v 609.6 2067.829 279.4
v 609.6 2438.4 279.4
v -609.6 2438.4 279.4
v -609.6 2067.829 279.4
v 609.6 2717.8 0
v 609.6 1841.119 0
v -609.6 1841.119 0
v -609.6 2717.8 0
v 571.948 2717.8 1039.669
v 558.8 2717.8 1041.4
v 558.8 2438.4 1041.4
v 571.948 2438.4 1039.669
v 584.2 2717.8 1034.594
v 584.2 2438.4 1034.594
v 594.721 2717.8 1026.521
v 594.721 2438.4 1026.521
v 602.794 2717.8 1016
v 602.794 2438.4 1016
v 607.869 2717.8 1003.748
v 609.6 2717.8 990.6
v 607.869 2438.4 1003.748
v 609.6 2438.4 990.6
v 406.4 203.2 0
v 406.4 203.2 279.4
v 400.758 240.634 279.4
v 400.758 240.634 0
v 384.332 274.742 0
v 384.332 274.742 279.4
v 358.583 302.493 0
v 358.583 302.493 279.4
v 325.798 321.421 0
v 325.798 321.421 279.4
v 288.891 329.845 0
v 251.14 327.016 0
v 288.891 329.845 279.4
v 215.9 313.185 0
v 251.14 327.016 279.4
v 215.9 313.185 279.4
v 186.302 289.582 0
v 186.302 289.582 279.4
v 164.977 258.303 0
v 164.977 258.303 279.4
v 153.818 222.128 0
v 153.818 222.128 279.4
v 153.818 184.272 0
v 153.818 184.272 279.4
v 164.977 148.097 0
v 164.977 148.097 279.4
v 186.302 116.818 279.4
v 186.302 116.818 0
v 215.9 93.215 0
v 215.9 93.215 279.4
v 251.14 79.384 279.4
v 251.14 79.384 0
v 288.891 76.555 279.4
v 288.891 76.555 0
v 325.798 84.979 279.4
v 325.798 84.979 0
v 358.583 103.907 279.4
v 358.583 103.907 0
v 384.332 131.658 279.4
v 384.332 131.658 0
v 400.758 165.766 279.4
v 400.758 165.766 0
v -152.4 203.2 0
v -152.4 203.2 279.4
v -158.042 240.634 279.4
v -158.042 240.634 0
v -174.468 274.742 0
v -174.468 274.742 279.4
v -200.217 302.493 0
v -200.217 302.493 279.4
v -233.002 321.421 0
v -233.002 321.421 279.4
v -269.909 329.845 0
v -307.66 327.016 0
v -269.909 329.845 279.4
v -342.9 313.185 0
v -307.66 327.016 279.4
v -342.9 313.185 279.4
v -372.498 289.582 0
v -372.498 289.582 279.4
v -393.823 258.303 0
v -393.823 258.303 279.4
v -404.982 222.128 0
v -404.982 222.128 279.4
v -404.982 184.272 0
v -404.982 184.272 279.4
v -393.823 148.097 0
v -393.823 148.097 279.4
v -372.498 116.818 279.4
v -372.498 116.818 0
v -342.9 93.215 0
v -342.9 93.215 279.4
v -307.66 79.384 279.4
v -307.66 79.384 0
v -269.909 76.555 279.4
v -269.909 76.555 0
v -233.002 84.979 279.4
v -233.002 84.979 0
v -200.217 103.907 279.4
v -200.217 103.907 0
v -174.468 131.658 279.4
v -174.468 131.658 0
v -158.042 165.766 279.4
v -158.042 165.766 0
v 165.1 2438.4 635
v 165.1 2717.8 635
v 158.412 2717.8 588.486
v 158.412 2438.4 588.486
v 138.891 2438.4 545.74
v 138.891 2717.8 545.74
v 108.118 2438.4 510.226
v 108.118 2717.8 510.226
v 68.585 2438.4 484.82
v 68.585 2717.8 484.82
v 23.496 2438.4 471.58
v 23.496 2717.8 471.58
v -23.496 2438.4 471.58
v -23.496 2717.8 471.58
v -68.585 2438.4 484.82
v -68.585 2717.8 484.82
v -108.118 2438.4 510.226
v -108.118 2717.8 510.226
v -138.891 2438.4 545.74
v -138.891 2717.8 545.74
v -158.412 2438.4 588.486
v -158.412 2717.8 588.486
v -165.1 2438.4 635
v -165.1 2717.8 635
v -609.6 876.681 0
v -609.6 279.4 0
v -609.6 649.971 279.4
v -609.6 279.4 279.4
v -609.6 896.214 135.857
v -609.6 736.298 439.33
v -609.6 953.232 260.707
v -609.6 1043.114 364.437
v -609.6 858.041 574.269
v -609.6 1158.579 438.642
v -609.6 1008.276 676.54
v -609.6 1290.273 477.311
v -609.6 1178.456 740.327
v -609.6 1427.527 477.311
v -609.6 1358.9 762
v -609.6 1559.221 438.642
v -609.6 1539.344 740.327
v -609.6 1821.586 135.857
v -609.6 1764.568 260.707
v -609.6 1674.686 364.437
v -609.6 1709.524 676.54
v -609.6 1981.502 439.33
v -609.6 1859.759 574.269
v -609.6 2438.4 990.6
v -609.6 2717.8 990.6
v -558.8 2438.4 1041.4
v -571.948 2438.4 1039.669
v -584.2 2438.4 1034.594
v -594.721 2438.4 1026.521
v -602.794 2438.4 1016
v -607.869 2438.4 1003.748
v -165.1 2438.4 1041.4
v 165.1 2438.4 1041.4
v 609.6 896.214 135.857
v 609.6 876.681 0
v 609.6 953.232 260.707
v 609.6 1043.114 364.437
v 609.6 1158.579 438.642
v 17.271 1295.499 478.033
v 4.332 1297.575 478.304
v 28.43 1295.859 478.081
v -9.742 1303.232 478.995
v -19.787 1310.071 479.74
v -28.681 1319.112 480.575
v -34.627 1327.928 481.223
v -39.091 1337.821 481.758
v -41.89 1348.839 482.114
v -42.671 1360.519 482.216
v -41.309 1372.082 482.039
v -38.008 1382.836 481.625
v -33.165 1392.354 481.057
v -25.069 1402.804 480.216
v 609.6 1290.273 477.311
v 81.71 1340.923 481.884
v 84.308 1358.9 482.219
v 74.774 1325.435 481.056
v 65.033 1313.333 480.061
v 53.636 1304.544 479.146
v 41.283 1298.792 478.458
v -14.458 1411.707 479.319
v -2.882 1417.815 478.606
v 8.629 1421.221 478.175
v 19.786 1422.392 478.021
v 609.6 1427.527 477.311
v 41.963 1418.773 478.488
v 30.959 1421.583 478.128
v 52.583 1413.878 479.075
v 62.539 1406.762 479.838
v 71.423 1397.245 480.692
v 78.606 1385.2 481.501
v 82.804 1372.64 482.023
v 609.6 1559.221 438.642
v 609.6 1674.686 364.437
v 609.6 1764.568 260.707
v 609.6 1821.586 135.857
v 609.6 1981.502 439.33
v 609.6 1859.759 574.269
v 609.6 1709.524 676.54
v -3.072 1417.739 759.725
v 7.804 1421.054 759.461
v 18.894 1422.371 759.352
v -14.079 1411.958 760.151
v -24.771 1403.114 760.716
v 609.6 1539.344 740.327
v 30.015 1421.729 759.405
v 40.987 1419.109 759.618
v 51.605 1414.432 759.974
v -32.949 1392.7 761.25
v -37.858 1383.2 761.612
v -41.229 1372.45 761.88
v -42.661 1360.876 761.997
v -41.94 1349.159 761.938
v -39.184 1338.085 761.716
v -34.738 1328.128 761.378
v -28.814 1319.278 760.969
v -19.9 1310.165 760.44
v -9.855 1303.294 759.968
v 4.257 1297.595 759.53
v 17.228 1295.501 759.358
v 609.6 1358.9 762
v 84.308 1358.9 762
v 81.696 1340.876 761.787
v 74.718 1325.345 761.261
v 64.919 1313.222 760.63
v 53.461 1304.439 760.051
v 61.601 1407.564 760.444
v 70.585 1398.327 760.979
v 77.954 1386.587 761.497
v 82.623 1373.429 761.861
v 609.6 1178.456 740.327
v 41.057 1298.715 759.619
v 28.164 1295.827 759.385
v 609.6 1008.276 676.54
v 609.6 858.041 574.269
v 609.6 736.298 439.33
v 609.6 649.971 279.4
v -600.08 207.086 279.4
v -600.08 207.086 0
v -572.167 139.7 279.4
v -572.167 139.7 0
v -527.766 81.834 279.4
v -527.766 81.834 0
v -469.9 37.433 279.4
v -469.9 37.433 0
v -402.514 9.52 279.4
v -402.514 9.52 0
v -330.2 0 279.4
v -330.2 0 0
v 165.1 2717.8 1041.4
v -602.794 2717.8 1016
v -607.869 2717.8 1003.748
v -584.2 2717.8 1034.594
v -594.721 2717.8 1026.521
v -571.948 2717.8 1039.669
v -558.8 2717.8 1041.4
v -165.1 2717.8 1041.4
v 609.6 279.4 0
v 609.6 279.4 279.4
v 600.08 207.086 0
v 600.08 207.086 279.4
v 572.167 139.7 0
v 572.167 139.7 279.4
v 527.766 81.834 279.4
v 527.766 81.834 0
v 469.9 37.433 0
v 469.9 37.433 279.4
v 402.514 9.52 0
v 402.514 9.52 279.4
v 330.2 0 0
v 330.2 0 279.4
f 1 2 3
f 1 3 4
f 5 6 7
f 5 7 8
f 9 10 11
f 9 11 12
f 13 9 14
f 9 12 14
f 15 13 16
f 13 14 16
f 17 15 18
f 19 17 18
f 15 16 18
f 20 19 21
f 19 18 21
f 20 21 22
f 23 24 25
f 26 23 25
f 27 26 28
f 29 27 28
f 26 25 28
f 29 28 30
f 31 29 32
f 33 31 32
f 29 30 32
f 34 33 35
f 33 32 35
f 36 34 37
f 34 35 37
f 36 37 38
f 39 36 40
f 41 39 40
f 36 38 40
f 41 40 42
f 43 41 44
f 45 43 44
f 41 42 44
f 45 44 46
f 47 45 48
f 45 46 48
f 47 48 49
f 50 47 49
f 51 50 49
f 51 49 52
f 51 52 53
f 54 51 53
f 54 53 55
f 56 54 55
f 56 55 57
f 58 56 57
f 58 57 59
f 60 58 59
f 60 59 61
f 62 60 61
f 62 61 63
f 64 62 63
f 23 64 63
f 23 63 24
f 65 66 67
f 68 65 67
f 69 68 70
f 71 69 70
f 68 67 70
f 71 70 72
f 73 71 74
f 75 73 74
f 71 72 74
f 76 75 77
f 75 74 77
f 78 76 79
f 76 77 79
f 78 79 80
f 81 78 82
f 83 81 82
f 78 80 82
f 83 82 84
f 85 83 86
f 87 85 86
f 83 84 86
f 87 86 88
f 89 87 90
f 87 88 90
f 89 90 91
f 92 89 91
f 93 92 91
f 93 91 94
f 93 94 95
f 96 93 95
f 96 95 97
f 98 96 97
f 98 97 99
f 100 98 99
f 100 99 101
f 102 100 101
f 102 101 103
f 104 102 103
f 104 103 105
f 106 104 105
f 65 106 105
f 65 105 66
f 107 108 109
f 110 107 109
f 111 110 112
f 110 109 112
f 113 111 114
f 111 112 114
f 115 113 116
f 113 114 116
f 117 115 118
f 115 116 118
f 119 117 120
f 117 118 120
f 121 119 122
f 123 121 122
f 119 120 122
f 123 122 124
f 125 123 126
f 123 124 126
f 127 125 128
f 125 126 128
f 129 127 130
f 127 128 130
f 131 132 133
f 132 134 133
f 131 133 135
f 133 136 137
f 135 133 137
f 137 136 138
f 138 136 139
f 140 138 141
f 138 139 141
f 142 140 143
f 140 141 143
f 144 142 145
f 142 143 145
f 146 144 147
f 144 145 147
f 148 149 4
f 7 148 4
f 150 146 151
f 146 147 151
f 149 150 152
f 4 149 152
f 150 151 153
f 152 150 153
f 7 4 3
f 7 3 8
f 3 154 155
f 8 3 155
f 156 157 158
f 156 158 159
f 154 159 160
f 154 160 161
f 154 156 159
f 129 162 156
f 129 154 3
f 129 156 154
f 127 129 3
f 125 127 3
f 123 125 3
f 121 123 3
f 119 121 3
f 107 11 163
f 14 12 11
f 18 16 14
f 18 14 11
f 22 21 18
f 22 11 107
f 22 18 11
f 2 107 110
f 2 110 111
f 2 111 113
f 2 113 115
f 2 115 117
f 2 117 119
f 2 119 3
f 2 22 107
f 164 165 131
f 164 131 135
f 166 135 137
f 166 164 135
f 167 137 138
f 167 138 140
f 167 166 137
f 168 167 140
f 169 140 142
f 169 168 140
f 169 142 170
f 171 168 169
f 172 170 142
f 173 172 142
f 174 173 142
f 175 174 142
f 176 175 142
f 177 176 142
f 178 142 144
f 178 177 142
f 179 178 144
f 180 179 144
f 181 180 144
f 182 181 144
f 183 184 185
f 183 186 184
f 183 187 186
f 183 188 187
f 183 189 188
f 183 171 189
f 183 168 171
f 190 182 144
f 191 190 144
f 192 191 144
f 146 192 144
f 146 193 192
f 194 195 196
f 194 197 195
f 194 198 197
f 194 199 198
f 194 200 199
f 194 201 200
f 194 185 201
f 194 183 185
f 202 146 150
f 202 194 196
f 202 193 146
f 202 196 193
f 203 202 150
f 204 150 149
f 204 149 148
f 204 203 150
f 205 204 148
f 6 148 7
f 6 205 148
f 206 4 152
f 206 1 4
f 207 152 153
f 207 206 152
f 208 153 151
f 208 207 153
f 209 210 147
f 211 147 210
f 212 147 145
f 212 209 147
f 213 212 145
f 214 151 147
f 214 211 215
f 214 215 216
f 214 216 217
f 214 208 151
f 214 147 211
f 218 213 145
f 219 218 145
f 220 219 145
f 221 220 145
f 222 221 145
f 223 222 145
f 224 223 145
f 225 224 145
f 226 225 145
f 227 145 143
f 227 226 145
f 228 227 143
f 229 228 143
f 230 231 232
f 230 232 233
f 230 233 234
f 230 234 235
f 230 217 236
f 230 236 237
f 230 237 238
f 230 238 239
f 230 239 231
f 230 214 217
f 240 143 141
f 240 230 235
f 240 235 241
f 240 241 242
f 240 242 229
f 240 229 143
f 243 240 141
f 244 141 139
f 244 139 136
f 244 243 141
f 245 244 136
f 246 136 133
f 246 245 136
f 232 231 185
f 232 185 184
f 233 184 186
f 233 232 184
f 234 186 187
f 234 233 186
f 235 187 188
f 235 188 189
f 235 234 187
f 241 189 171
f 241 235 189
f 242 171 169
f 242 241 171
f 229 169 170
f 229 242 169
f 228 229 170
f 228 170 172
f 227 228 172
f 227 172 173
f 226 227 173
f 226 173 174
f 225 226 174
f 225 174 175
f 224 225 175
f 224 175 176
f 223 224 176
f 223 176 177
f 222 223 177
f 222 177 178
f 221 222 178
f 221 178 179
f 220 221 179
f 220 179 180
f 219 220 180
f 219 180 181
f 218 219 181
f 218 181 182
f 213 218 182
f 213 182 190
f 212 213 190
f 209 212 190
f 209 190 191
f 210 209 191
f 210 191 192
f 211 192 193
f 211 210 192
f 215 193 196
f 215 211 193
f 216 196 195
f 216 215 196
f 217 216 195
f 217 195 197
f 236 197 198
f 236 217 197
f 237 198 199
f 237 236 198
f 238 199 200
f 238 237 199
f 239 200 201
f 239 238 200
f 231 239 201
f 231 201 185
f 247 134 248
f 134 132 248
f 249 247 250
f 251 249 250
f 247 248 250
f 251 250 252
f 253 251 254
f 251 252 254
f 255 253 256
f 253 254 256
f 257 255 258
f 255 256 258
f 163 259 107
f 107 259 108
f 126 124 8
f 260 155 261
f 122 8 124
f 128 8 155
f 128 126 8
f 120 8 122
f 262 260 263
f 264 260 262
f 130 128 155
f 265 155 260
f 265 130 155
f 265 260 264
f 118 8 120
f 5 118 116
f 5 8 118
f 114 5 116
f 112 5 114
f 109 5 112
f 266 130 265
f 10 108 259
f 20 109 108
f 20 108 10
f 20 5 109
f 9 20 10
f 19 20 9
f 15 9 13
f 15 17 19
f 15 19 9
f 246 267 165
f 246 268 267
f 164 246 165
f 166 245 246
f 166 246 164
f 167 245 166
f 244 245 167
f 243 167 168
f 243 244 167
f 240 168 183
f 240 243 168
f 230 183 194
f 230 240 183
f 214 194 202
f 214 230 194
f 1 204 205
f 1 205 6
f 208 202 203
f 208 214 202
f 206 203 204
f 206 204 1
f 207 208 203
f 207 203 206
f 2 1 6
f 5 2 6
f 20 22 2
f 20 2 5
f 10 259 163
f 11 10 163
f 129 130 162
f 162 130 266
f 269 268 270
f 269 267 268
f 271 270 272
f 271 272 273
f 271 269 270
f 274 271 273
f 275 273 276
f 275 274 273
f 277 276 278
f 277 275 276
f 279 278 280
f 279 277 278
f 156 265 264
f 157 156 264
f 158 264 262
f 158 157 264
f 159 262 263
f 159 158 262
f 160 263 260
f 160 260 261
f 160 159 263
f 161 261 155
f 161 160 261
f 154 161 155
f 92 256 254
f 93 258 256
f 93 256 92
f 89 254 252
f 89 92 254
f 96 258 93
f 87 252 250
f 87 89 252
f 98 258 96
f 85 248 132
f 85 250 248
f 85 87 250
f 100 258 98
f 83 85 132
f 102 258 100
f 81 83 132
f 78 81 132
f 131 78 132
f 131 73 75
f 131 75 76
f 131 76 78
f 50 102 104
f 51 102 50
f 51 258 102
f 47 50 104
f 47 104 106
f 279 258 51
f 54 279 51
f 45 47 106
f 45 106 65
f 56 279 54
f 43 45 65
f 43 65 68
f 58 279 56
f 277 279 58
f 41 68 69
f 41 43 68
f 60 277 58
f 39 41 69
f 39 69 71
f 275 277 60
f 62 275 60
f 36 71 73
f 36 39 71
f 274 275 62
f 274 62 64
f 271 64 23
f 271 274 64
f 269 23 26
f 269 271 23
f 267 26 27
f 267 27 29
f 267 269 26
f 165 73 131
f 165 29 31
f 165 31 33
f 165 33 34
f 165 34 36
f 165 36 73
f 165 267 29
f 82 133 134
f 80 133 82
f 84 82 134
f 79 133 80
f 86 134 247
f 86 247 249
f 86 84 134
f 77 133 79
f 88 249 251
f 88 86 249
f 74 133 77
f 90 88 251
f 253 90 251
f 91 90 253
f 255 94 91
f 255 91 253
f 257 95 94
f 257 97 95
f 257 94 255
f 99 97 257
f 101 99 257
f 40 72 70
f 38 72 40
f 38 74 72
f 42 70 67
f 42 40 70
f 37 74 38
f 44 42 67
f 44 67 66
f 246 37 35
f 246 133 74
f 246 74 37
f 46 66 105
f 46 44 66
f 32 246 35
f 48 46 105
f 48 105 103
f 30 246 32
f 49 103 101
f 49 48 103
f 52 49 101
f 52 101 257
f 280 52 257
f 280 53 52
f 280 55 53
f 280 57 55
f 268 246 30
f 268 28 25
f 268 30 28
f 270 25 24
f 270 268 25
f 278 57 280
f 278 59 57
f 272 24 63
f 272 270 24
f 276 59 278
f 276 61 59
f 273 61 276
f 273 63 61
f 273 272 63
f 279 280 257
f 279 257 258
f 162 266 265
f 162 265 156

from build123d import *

# Parameters (mm, degrees)
F1_DEPTH  = 609.6
F2_R      = 50.8
F4_DEPTH  = 279.4
F5_R      = 127
F6_DEPTH  = 279.401
F7_DEPTH  = 25.4
F8_R      = 279.4
F10_R     = 63.5
F11_DEPTH = 762.001


with BuildPart() as f1:
    # F0 (on Right) → F1 (new body, symmetric)
    with BuildSketch(Plane.YZ):
        with BuildLine():
            Line((0, 279.4), (0, 0))
            Line((0, 0), (596.9, 0))
            Line((596.9, 0), (876.681, 0))
            ThreePointArc((876.681, 0), (1358.9, 482.219), (1841.119, 0))
            Line((1841.119, 0), (2120.9, 0))
            Line((2120.9, 0), (2438.4, 0))
            Line((2438.4, 0), (2717.8, 0))
            Line((2717.8, 0), (2717.8, 279.4))
            Line((2717.8, 279.4), (2717.8, 1041.4))
            Line((2717.8, 1041.4), (2438.4, 1041.4))
            Line((2438.4, 1041.4), (2438.4, 279.4))
            Line((2438.4, 279.4), (2067.8285154372, 279.4))
            ThreePointArc((2067.8285154372, 279.4), (1358.9, 762), (649.9714845628, 279.4))
            Line((649.9714845628, 279.4), (0, 279.4))
        make_face()
    extrude(amount=F1_DEPTH, both=True)

    # F2
    f2_edges = [f1.edges().sort_by_distance(p)[0] for p in [
        (609.6, 2578.1, 1041.4),
        (-609.6, 2578.1, 1041.4),
    ]]
    fillet(f2_edges, radius=F2_R)

    # F3 (on face) → F4 (cut, through all)
    with BuildSketch(Plane(origin=(0, 2717.8, 0), x_dir=(-1, 0, 0), z_dir=(0, 1, 0))):
        with BuildLine():
            Line((165.1, 1041.4), (-165.1, 1041.4))
            Line((-165.1, 1041.4), (-165.1, 635))
            ThreePointArc((-165.1, 635), (0, 469.9), (165.1, 635))
            Line((165.1, 635), (165.1, 1041.4))
        make_face()
    extrude(amount=-F4_DEPTH, mode=Mode.SUBTRACT)

    # F5 (on face) → F6 (cut, through all)
    with BuildSketch(Plane.XY.offset(279.4)):
        with Locations((-279.4, 203.2)):
            Circle(F5_R)
        with Locations((279.4, 203.2)):
            Circle(F5_R)
    extrude(amount=-F6_DEPTH, mode=Mode.SUBTRACT)

    # F5 (on face) → F7 (cut)
    with BuildSketch(Plane.XY.offset(279.4)):
        with Locations((-279.4, 203.2)):
            Circle(F5_R)
        with Locations((279.4, 203.2)):
            Circle(F5_R)
    extrude(amount=F7_DEPTH, mode=Mode.SUBTRACT)

    # F8
    f8_edges = [f1.edges().sort_by_distance(p)[0] for p in [
        (609.6, 0, 139.7),
        (-609.6, 0, 139.7),
    ]]
    fillet(f8_edges, radius=F8_R)

    # F10 (on offset) → F11 (cut, through all)
    with BuildSketch(Plane(origin=(0, 0, 762), x_dir=(1, 0, 0), z_dir=(0, 0, -1))):
        with Locations((20.8079852581, -1358.9)):
            Circle(F10_R)
    extrude(amount=F11_DEPTH, mode=Mode.SUBTRACT)


solid = f1.part
